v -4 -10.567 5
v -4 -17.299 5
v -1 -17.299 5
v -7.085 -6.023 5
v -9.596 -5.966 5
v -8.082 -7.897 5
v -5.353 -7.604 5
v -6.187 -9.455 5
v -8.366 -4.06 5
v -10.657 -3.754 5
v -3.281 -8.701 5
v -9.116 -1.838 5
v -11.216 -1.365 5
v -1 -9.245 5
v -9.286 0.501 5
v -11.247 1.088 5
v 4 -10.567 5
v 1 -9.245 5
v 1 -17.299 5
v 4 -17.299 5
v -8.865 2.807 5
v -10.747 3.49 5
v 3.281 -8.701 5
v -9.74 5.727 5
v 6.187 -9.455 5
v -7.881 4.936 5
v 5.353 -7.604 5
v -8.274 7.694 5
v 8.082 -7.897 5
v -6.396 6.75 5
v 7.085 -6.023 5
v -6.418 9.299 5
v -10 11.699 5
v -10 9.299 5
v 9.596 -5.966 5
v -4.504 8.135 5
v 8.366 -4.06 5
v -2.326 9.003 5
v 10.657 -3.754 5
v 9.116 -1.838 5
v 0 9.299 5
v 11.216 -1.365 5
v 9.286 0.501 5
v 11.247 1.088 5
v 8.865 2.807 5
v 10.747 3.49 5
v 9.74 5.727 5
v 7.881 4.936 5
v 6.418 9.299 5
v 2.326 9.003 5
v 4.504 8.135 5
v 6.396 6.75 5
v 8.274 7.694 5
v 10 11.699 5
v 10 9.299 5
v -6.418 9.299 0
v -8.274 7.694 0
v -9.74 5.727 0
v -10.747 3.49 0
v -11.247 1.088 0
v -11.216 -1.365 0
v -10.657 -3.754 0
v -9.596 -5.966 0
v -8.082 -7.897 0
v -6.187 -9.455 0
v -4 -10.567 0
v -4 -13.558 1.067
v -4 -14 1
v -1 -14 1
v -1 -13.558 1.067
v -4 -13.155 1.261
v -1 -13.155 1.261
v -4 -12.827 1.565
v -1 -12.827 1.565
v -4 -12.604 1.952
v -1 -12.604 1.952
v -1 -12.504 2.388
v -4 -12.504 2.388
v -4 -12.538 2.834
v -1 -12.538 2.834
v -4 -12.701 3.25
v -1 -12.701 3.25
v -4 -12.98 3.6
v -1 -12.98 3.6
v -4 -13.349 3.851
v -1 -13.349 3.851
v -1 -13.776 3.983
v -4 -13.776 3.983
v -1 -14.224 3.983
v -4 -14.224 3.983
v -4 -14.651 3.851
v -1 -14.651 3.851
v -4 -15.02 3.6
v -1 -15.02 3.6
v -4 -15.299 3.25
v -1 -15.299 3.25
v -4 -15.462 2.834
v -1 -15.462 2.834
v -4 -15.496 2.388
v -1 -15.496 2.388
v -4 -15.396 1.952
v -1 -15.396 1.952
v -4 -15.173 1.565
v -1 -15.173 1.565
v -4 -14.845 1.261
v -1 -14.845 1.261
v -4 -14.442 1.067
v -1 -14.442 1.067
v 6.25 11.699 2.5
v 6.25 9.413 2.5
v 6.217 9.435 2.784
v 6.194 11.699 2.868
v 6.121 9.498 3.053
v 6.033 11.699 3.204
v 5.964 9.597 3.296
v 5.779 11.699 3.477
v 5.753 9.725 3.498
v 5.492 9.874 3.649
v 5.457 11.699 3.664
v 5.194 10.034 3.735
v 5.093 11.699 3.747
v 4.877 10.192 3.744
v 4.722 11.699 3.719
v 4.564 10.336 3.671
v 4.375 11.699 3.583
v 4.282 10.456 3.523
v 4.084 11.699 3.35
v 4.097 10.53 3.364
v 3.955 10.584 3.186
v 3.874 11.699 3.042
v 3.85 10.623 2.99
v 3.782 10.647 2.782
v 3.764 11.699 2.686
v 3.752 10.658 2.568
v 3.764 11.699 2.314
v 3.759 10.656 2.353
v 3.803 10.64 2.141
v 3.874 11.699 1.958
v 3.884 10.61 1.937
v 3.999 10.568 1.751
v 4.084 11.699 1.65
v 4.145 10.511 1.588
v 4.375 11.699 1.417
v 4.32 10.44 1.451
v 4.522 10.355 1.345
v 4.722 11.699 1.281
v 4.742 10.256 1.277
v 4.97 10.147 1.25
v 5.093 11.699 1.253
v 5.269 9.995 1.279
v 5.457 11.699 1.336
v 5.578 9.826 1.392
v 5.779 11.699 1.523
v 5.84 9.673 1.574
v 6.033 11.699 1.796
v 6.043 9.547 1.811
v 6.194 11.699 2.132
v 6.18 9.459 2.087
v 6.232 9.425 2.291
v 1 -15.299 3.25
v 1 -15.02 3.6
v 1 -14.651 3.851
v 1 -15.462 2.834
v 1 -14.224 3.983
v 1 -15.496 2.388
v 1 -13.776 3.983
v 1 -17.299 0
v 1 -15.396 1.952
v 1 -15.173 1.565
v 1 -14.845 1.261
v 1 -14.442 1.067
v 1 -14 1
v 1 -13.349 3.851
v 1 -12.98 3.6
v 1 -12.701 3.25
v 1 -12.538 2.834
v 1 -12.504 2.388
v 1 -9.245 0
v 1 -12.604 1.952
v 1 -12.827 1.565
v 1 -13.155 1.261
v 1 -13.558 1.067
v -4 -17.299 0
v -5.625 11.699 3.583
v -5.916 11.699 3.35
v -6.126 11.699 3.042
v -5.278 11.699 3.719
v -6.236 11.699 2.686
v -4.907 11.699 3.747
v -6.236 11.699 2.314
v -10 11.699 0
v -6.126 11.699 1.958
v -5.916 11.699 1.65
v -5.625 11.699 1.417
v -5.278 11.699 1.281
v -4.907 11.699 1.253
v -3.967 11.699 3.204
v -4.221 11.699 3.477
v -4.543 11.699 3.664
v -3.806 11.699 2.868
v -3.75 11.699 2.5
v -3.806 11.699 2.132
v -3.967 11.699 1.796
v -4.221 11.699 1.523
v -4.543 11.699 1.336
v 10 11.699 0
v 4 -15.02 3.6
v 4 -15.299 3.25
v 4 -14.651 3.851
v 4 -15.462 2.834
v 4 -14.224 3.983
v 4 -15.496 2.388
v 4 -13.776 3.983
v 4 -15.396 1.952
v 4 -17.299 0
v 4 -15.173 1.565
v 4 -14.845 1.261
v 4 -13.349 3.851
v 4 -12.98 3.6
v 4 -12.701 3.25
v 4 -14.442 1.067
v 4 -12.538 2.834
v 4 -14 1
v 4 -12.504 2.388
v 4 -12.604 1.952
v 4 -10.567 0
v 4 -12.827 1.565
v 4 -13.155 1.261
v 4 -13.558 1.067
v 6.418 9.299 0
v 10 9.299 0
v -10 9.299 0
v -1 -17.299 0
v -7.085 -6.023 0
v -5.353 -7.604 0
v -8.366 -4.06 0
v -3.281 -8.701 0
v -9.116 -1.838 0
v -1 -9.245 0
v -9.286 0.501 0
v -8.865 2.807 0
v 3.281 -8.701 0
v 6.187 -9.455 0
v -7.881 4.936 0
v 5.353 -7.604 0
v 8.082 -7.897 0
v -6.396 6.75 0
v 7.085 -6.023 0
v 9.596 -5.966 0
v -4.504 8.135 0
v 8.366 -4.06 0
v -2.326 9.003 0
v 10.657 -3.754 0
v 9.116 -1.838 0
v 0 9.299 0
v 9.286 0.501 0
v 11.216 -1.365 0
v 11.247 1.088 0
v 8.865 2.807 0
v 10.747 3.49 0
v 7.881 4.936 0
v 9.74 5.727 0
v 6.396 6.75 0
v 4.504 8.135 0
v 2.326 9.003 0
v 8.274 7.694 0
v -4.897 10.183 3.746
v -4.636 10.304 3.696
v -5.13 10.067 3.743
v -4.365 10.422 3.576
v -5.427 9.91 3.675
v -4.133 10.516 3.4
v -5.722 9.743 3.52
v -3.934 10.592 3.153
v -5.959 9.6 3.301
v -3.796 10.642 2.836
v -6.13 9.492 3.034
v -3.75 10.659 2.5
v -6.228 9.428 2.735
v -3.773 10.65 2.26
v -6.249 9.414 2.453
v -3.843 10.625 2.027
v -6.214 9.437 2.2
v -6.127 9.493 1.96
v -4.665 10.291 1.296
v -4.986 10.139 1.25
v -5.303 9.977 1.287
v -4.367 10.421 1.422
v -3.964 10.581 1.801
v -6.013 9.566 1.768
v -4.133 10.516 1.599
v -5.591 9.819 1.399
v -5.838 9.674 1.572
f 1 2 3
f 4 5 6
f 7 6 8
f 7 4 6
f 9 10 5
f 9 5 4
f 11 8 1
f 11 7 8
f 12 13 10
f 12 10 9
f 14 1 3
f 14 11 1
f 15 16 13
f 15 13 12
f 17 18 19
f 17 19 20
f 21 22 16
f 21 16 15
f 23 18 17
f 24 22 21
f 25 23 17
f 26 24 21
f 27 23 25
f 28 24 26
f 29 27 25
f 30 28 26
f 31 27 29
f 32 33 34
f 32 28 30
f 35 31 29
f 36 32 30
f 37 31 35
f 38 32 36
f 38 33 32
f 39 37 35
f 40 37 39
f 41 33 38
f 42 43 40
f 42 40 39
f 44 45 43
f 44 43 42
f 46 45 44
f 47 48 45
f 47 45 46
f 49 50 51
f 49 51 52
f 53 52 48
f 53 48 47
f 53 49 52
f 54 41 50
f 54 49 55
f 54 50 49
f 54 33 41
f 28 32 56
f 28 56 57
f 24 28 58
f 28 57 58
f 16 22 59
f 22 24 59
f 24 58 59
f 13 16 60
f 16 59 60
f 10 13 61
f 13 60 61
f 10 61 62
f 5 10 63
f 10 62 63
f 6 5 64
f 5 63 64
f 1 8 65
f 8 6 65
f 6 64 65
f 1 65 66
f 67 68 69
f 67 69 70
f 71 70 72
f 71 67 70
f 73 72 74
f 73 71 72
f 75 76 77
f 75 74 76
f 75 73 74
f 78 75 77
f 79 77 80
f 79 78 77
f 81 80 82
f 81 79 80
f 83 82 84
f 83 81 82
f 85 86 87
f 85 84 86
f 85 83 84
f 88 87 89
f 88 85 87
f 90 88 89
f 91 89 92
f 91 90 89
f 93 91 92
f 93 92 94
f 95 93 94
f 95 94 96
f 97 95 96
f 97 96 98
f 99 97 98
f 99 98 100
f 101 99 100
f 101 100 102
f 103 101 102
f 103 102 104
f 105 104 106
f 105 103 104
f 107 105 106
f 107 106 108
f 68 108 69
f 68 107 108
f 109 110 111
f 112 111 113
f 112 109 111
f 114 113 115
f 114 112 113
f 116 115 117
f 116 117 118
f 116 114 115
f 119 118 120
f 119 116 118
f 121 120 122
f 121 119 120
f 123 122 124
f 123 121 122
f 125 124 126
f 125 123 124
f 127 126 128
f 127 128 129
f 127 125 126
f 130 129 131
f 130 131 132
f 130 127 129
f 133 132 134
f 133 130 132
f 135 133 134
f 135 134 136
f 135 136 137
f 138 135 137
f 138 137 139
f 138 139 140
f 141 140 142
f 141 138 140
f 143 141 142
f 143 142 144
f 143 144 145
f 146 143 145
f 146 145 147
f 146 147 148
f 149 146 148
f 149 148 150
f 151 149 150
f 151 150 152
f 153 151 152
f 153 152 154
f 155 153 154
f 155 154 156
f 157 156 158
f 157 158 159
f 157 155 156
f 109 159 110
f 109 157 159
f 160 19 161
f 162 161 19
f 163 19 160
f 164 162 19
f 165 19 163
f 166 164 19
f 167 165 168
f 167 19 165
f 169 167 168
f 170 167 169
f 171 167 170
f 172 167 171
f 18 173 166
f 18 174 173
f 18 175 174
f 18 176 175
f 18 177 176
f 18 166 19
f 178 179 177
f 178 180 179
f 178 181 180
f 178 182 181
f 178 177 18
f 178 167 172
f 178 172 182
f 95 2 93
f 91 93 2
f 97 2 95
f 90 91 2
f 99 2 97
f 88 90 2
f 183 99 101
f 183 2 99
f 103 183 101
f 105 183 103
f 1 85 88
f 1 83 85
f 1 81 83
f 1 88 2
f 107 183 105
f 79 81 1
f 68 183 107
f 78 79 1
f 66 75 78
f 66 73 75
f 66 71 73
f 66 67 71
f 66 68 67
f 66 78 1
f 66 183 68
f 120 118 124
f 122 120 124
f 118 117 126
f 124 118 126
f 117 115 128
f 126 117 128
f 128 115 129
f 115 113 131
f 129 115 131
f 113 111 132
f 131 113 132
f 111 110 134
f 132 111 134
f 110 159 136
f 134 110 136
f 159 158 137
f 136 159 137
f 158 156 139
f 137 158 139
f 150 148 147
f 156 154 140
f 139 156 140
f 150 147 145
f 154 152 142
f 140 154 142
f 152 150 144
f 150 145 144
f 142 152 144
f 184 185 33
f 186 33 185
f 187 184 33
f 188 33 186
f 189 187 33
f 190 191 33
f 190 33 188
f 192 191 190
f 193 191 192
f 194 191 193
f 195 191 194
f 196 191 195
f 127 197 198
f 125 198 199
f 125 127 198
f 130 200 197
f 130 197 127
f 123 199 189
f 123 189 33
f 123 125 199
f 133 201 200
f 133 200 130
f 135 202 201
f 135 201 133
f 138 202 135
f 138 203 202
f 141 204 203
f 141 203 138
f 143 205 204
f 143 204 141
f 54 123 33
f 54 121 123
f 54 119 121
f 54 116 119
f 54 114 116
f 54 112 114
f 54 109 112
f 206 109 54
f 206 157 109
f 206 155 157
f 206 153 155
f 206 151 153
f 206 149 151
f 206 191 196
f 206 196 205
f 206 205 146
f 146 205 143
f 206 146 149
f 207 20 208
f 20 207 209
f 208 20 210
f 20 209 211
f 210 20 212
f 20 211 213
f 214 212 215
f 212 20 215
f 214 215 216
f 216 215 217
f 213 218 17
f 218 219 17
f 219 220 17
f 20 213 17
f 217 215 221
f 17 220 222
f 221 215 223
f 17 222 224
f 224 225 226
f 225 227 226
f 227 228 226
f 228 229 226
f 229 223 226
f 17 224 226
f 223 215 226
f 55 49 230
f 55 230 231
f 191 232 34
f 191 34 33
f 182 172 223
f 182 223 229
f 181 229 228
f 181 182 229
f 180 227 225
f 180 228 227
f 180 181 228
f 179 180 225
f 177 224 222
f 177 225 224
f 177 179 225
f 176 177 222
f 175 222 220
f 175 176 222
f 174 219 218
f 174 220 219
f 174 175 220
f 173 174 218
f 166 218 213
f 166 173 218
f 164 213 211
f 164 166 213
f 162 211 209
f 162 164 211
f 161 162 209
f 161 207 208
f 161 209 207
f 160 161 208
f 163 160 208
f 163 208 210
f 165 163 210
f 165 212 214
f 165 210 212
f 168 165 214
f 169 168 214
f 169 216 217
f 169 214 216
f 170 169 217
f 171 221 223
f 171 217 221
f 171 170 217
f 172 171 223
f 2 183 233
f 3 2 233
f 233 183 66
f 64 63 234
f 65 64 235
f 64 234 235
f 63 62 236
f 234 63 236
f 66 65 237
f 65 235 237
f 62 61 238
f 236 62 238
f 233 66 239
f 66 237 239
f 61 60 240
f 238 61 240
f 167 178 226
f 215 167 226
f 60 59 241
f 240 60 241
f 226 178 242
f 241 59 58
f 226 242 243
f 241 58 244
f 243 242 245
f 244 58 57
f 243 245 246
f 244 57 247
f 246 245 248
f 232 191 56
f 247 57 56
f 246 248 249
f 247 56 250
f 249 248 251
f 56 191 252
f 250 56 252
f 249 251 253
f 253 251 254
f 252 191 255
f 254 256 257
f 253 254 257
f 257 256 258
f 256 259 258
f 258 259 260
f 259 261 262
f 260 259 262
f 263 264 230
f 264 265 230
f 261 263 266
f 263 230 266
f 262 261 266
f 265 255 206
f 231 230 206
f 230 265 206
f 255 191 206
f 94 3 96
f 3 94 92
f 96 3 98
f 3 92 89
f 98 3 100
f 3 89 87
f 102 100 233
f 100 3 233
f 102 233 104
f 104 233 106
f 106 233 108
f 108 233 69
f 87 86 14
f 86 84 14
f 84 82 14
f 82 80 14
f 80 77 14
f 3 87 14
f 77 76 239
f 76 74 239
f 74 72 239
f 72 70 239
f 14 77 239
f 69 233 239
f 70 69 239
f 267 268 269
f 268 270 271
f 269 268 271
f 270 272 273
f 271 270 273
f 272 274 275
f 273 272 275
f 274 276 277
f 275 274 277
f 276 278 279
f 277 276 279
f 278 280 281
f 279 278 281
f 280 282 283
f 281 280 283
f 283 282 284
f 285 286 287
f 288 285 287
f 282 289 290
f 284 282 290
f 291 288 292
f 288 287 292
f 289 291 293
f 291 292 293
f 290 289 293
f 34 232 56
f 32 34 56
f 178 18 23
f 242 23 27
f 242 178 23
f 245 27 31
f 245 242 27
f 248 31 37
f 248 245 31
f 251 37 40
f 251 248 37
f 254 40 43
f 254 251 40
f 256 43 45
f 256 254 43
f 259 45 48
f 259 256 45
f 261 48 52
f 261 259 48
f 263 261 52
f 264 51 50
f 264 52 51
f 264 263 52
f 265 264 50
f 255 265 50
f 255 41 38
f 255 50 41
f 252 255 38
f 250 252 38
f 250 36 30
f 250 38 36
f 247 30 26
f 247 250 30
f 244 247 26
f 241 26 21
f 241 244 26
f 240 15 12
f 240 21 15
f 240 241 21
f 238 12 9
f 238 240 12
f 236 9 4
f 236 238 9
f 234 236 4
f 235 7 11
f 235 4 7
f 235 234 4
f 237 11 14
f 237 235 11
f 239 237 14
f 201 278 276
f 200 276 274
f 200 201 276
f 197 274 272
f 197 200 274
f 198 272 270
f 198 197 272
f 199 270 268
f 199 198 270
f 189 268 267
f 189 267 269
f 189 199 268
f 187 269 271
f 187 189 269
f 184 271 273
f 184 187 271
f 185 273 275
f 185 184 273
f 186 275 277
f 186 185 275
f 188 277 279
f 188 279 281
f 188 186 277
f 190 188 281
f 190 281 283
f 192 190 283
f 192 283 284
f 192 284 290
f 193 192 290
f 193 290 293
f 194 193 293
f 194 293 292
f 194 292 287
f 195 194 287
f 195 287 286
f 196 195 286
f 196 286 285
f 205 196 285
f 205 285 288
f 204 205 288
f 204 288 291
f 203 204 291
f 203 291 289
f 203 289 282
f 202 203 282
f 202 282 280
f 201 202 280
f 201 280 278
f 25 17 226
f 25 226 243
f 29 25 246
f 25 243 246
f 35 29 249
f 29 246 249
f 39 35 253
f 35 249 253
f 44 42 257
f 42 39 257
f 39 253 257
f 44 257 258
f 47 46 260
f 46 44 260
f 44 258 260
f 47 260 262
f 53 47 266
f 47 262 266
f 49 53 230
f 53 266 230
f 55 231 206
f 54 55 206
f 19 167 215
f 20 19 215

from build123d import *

# Parameters (mm, degrees)
BOX005_W                = 2
BOX005_H                = 10
BOX005_DEPTH            = 10
CYLINDER029_R           = 9.299038
CYLINDER029_DEPTH       = 10
CYLINDER030_R           = 11.299038
CYLINDER030_DEPTH       = 5
CYLINDER032_R           = 1.25
CYLINDER032_DEPTH       = 5
CYLINDER032_ROLL_ANGLE  = 90
CYLINDER031_R           = 1.25
CYLINDER031_DEPTH       = 5
CYLINDER031_ROLL_ANGLE  = 90
BOX003_W                = 20
BOX003_H                = 2.4
BOX003_DEPTH            = 5
CYLINDER033_R           = 1.5
CYLINDER033_DEPTH       = 10
CYLINDER033_PITCH_ANGLE = 90
BOX004_W                = 8
BOX004_H                = 8
BOX004_DEPTH            = 5


with BuildPart() as quader004:
    # Box005 → Box005 (new body)
    with BuildSketch(Plane(origin=(-1, -19, -1), x_dir=(1, 0, 0), z_dir=(0, 0, 1))):
        with Locations((1, 5)):
            Rectangle(BOX005_W, BOX005_H)
    extrude(amount=BOX005_DEPTH)


with BuildPart() as zylinder027:
    # Cylinder029 → Cylinder029 (new body)
    with BuildSketch(Plane.XY):
        Circle(CYLINDER029_R)
    extrude(amount=CYLINDER029_DEPTH)


with BuildPart() as cut043:
    # Cylinder030 → Cylinder030 (new body)
    with BuildSketch(Plane.XY):
        Circle(CYLINDER030_R)
    extrude(amount=CYLINDER030_DEPTH)

    # Cut043: cut Zylinder027
    add(zylinder027.part, mode=Mode.SUBTRACT)


with BuildPart() as zylinder030:
    # Cylinder032 → Cylinder032 (new body)
    with BuildSketch(Plane.XY):
        Circle(CYLINDER032_R)
    extrude(amount=CYLINDER032_DEPTH)


with BuildPart() as zylinder030_1:
    # Cylinder032 roll: moved
    add(zylinder030.part.rotate(Axis((0, 0, 0), (1, 0, 0)), CYLINDER032_ROLL_ANGLE))


with BuildPart() as zylinder030_2:
    # Cylinder032 placement: moved
    add(zylinder030_1.part.moved(Location((-5, 14, 2.5))))


with BuildPart() as zylinder029:
    # Cylinder031 → Cylinder031 (new body)
    with BuildSketch(Plane.XY):
        Circle(CYLINDER031_R)
    extrude(amount=CYLINDER031_DEPTH)


with BuildPart() as zylinder029_1:
    # Cylinder031 roll: moved
    add(zylinder029.part.rotate(Axis((0, 0, 0), (1, 0, 0)), CYLINDER031_ROLL_ANGLE))


with BuildPart() as zylinder029_2:
    # Cylinder031 placement: moved
    add(zylinder029_1.part.moved(Location((5, 14, 2.5))))


with BuildPart() as cut045:
    # Box003 → Box003 (new body)
    with BuildSketch(Plane(origin=(-10, 9.299038, 0), x_dir=(1, 0, 0), z_dir=(0, 0, 1))):
        with Locations((10, 1.2)):
            Rectangle(BOX003_W, BOX003_H)
    extrude(amount=BOX003_DEPTH)

    # Cut044: cut Zylinder029
    add(zylinder029_2.part, mode=Mode.SUBTRACT)

    # Cut045: cut Zylinder030
    add(zylinder030_2.part, mode=Mode.SUBTRACT)


with BuildPart() as zylinder031:
    # Cylinder033 → Cylinder033 (new body)
    with BuildSketch(Plane.XY):
        Circle(CYLINDER033_R)
    extrude(amount=CYLINDER033_DEPTH)


with BuildPart() as zylinder031_1:
    # Cylinder033 pitch: moved
    add(zylinder031.part.rotate(Axis((0, 0, 0), (0, 1, 0)), CYLINDER033_PITCH_ANGLE))


with BuildPart() as zylinder031_2:
    # Cylinder033 placement: moved
    add(zylinder031_1.part.moved(Location((-5, -14, 2.5))))


with BuildPart() as endschalter:
    # Box004 → Box004 (new body)
    with BuildSketch(Plane(origin=(-4, -17.299038, 0), x_dir=(1, 0, 0), z_dir=(0, 0, 1))):
        with Locations((4, 4)):
            Rectangle(BOX004_W, BOX004_H)
    extrude(amount=BOX004_DEPTH)

    # Cut046: cut Zylinder031
    add(zylinder031_2.part, mode=Mode.SUBTRACT)

    # Fusion003: union Cut043, Cut045
    add(cut043.part)
    add(cut045.part)

    # Cut047: cut Quader004
    add(quader004.part, mode=Mode.SUBTRACT)


solid = endschalter.part
